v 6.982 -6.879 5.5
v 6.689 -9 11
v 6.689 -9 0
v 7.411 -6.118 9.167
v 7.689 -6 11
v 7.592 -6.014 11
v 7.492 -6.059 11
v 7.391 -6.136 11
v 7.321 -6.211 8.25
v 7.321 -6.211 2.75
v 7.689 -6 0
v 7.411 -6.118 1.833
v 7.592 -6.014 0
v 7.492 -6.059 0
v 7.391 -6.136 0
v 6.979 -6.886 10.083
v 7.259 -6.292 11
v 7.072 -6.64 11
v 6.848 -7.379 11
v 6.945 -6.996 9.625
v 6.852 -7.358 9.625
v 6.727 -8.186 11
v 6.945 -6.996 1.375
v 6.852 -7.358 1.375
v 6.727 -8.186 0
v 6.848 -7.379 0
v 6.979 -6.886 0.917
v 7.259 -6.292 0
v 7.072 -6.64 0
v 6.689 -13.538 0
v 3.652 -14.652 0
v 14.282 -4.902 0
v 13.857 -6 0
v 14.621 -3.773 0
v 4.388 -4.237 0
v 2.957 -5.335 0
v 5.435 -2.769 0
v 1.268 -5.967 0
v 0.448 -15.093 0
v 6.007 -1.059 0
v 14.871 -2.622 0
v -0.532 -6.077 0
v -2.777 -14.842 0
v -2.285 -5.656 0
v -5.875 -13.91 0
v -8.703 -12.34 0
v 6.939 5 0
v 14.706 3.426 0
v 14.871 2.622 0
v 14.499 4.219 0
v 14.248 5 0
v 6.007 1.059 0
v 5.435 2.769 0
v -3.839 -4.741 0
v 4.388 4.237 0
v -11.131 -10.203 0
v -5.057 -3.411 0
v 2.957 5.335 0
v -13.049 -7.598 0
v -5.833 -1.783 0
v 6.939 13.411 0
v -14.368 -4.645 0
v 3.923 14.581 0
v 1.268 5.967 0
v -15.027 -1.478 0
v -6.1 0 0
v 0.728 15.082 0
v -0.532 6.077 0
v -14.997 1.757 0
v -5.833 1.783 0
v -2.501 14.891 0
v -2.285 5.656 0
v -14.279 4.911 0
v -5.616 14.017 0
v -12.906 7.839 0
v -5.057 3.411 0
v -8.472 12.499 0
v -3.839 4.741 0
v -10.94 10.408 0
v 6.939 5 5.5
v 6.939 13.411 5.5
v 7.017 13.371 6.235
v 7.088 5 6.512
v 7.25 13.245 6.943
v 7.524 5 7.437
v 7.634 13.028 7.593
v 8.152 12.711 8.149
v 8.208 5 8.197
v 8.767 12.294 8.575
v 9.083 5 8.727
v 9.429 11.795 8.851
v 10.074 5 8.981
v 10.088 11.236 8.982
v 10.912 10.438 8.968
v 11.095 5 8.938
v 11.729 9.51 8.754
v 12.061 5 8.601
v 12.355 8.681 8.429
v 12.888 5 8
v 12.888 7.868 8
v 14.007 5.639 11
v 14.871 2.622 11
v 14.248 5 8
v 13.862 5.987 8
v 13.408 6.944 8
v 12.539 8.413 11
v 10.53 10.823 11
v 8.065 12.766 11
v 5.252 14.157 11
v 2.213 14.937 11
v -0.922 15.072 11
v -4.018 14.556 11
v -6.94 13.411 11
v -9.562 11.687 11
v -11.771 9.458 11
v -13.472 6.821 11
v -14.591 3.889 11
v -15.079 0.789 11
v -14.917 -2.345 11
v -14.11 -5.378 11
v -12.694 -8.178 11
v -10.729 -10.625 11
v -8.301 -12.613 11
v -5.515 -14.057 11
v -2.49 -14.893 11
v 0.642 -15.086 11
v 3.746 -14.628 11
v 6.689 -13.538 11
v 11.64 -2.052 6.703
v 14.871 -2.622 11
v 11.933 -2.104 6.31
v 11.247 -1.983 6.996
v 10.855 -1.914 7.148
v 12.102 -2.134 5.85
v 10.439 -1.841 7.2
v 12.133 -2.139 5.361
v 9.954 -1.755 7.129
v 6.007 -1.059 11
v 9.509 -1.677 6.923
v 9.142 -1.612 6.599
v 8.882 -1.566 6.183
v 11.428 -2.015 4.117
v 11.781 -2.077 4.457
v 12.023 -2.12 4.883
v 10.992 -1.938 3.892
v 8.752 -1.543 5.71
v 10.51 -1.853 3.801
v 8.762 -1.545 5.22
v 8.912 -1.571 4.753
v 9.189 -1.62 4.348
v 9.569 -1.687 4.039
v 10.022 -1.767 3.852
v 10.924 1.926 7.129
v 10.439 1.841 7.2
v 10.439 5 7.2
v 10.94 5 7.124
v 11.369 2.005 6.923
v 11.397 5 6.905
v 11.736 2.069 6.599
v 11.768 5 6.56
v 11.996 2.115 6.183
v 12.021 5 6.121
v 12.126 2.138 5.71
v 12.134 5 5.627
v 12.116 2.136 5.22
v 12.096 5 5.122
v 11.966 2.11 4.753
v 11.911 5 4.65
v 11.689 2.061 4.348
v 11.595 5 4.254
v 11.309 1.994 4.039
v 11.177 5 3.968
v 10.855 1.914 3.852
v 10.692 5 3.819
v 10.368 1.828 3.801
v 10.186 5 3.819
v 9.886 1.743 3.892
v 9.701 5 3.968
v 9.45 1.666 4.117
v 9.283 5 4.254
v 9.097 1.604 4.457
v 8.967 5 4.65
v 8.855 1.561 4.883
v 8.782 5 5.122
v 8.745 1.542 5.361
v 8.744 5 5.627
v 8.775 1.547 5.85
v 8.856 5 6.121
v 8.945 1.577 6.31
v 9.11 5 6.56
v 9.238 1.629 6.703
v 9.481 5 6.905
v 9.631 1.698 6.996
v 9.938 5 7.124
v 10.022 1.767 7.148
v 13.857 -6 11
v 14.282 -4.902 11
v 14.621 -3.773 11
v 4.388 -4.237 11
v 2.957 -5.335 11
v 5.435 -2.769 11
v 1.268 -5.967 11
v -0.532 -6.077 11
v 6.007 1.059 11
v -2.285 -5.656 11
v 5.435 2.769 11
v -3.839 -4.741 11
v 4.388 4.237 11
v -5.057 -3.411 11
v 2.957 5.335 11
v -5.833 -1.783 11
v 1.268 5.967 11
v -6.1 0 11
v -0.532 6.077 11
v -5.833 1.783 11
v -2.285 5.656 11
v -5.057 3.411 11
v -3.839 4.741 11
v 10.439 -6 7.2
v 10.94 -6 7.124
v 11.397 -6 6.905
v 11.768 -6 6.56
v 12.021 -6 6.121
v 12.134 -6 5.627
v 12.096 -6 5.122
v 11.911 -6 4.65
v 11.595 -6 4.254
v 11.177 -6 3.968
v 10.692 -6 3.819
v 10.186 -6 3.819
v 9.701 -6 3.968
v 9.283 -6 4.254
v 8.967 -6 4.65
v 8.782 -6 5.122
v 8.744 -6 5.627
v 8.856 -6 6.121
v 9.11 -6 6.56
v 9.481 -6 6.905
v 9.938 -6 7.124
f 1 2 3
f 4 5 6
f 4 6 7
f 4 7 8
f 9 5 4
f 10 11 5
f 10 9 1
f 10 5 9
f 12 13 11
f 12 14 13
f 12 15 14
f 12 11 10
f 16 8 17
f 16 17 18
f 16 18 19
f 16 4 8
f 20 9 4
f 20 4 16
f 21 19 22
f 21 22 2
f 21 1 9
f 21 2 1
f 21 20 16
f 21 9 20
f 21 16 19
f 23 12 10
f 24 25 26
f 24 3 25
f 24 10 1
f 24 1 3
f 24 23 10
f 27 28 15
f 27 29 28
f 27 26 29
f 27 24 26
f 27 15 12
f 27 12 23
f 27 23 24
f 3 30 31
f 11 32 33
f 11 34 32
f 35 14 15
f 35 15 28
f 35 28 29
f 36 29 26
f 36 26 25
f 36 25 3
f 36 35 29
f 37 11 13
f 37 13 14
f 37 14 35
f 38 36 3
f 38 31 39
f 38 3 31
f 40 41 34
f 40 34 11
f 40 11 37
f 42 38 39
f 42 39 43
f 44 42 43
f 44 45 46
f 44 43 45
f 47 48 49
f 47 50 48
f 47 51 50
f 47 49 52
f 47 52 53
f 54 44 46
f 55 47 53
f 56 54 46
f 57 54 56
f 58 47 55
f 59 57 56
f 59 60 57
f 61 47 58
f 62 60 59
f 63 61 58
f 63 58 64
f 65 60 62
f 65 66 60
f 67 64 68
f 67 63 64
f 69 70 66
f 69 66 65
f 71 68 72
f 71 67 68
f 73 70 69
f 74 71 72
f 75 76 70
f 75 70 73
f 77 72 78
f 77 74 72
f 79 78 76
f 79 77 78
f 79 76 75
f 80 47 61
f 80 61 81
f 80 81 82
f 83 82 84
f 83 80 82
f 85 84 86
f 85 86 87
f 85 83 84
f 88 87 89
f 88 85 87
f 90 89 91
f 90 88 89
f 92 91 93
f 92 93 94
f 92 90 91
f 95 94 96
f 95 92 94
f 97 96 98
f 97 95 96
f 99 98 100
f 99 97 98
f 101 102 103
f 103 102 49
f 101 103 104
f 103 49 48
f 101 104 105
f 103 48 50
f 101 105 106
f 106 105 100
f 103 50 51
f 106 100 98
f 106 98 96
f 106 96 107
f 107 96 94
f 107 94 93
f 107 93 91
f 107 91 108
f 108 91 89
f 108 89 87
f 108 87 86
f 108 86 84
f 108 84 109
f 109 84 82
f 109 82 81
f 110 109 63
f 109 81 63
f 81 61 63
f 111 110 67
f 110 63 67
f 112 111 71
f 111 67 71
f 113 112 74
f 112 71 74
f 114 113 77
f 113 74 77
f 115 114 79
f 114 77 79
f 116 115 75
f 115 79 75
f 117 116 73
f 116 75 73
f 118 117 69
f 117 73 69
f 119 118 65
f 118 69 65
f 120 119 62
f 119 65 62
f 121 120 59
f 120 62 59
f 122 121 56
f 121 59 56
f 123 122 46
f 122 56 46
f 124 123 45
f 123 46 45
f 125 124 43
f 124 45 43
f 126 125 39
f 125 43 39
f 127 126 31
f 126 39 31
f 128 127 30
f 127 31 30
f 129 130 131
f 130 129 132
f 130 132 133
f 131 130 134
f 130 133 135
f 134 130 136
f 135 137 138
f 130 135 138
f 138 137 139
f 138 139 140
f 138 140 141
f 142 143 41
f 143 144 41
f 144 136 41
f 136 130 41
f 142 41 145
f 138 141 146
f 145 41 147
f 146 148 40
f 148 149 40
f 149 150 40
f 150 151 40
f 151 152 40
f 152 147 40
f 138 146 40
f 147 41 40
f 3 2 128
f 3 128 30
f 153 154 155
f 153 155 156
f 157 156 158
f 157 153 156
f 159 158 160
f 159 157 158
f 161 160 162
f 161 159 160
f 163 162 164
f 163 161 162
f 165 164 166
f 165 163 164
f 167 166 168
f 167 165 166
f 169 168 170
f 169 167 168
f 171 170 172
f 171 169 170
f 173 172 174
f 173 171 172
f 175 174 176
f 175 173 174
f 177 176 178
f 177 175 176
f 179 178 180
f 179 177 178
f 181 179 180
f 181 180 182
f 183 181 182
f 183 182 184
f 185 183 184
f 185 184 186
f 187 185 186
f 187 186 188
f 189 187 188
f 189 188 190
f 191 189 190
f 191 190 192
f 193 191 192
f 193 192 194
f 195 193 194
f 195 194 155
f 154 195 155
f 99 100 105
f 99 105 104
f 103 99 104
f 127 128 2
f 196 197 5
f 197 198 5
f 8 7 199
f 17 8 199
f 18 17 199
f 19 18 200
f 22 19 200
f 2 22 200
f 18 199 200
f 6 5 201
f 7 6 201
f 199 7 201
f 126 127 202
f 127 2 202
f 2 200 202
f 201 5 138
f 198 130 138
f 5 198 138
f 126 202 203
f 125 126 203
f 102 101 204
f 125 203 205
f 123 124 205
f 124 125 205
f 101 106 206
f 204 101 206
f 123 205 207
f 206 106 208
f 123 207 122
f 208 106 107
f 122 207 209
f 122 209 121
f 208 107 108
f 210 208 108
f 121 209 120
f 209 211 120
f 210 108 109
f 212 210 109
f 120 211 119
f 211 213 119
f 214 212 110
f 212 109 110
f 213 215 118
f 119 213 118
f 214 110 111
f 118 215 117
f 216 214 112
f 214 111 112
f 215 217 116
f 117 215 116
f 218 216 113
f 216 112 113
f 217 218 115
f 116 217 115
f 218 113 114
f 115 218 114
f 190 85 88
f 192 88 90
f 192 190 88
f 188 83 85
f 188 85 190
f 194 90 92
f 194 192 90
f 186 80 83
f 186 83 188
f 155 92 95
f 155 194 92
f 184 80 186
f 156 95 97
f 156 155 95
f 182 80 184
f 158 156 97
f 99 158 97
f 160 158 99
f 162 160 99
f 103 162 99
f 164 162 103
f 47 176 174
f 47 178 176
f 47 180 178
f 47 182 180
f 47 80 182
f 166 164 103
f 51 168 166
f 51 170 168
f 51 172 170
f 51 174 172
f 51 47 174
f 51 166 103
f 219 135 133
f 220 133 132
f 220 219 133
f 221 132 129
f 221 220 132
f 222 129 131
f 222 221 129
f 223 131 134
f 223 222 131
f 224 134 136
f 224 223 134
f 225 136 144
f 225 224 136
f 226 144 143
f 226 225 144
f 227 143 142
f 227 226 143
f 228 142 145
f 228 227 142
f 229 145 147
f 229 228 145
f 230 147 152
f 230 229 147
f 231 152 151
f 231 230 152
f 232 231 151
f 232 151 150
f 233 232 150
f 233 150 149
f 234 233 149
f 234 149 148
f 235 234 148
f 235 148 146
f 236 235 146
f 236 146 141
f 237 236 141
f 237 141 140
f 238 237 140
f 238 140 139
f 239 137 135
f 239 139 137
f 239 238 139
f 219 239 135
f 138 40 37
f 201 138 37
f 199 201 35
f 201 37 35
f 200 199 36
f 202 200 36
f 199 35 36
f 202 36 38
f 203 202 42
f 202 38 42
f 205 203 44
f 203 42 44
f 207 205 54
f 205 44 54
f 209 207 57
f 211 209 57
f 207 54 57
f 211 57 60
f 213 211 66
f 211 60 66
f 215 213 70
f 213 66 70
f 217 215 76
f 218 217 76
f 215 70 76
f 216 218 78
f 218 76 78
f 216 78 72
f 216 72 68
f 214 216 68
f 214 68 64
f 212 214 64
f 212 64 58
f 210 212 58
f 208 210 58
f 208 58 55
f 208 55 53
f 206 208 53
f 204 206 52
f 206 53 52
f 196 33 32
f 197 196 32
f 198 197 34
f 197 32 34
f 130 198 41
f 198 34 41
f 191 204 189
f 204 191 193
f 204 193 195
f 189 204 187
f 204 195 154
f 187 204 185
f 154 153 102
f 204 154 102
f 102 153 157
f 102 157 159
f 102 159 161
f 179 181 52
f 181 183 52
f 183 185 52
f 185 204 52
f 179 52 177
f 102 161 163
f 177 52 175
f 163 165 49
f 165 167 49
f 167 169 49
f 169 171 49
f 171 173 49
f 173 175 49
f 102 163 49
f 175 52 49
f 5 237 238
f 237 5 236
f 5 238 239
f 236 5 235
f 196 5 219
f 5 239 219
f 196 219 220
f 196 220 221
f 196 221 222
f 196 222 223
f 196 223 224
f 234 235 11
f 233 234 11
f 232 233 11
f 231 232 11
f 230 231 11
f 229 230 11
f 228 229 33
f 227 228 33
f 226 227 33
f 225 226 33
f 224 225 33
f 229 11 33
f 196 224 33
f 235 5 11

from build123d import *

# Parameters (mm, degrees)
BOSS_EXTRUDE1_DEPTH     = 11
CUT_EXTRUDE1_DEPTH      = 25.021240601
CUT_EXTRUDE1_DEPTH_BACK = 25.021240601
SKETCH3_R               = 1.7
CUT_EXTRUDE2_START      = 5
SKETCH3_3_R             = 3.5
SKETCH3_3_R_2           = 1.7
CUT_EXTRUDE2_DEPTH      = 20.021240772
CUT_EXTRUDE4_START      = -6
SKETCH4_W               = 8.181634888
SKETCH4_H               = 11
CUT_EXTRUDE4_DEPTH      = 19.021240772
FILLET1_SIZE            = 1
FILLET1_SIZE_2          = 3


with BuildPart() as part:
    # Sketch1 → Boss-Extrude1 (new body)
    with BuildSketch(Plane.XY):
        with BuildLine():
            Line((6.007327293, 1.059253884), (14.87059707, 2.622087483))
            ThreePointArc((14.87059707, 2.622087483), (-15.1, 0), (14.87059707, -2.622087483))
            Line((14.87059707, -2.622087483), (6.007327293, -1.059253884))
            ThreePointArc((6.007327293, -1.059253884), (-6.1, 0), (6.007327293, 1.059253884))
        make_face()
    extrude(amount=BOSS_EXTRUDE1_DEPTH)

    # Sketch3 → Cut-Extrude1 (cut, two sides: drawn at the far end of the back side and taken through both)
    with BuildSketch(Plane(origin=(0, 0, 0), x_dir=(1, 0, 0), z_dir=(0, 1, 0)).offset(-CUT_EXTRUDE1_DEPTH_BACK)):
        with Locations(Location((10.438962182, -5.5, 0), (0, 0, 270))):
            Circle(SKETCH3_R)
    extrude(amount=CUT_EXTRUDE1_DEPTH + CUT_EXTRUDE1_DEPTH_BACK, mode=Mode.SUBTRACT)

    # Sketch3<3> → Cut-Extrude2 (cut, through all)
    # profile 1 of 2: a face of its own
    with BuildSketch(Plane(origin=(0, 0, 0), x_dir=(1, 0, 0), z_dir=(0, 1, 0)).offset(CUT_EXTRUDE2_START)):
        with Locations((10.438962182, -5.5)):
            Circle(SKETCH3_3_R)
        with Locations(Location((10.438962182, -5.5, 0), (0, 0, 270))):
            Circle(SKETCH3_3_R_2, mode=Mode.SUBTRACT)
    # profile 2 of 2: a face of its own
    with BuildSketch(Plane(origin=(0, 0, 0), x_dir=(1, 0, 0), z_dir=(0, 1, 0)).offset(CUT_EXTRUDE2_START)):
        with BuildLine():
            Line((6.938962182, 0), (6.938962182, -5.5))
            ThreePointArc((6.938962182, -5.5), (10.438962182, -2), (13.938962182, -5.5))
            ThreePointArc((13.938962182, -5.5), (13.665664376, -6.855873501), (12.888451925, -8))
            Line((12.888451925, -8), (14.87059707, -8))
            Line((14.87059707, -8), (14.87059707, -5.5))
            Line((14.87059707, -5.5), (14.87059707, 0))
            Line((14.87059707, 0), (6.938962182, 0))
        make_face()
    extrude(amount=CUT_EXTRUDE2_DEPTH, mode=Mode.SUBTRACT)

    # Sketch4 → Cut-Extrude4 (cut, through all)
    with BuildSketch(Plane(origin=(0, 0, 0), x_dir=(1, 0, 0), z_dir=(0, 1, 0)).offset(CUT_EXTRUDE4_START)):
        with Locations((10.779779626, -5.5)):
            Rectangle(SKETCH4_W, SKETCH4_H)
    extrude(amount=-CUT_EXTRUDE4_DEPTH, mode=Mode.SUBTRACT)

    # Fillet1
    # an asymmetric fillet: 3, 1 mm, written as the material it adds along each edge
    with BuildSketch(Plane(origin=(6.688962182, -6, 0), x_dir=(1, 0, 0), z_dir=(0, 0, 1))) as fillet1_piece_1:
        with BuildLine():
            Bezier((FILLET1_SIZE, 0), (0, 0), (0, -FILLET1_SIZE_2), weights=[1, 0.707106781, 1])
            Line((0, -FILLET1_SIZE_2), (0, 0))
            Line((0, 0), (FILLET1_SIZE, 0))
        make_face()
    extrude(amount=11)


solid = part.part
